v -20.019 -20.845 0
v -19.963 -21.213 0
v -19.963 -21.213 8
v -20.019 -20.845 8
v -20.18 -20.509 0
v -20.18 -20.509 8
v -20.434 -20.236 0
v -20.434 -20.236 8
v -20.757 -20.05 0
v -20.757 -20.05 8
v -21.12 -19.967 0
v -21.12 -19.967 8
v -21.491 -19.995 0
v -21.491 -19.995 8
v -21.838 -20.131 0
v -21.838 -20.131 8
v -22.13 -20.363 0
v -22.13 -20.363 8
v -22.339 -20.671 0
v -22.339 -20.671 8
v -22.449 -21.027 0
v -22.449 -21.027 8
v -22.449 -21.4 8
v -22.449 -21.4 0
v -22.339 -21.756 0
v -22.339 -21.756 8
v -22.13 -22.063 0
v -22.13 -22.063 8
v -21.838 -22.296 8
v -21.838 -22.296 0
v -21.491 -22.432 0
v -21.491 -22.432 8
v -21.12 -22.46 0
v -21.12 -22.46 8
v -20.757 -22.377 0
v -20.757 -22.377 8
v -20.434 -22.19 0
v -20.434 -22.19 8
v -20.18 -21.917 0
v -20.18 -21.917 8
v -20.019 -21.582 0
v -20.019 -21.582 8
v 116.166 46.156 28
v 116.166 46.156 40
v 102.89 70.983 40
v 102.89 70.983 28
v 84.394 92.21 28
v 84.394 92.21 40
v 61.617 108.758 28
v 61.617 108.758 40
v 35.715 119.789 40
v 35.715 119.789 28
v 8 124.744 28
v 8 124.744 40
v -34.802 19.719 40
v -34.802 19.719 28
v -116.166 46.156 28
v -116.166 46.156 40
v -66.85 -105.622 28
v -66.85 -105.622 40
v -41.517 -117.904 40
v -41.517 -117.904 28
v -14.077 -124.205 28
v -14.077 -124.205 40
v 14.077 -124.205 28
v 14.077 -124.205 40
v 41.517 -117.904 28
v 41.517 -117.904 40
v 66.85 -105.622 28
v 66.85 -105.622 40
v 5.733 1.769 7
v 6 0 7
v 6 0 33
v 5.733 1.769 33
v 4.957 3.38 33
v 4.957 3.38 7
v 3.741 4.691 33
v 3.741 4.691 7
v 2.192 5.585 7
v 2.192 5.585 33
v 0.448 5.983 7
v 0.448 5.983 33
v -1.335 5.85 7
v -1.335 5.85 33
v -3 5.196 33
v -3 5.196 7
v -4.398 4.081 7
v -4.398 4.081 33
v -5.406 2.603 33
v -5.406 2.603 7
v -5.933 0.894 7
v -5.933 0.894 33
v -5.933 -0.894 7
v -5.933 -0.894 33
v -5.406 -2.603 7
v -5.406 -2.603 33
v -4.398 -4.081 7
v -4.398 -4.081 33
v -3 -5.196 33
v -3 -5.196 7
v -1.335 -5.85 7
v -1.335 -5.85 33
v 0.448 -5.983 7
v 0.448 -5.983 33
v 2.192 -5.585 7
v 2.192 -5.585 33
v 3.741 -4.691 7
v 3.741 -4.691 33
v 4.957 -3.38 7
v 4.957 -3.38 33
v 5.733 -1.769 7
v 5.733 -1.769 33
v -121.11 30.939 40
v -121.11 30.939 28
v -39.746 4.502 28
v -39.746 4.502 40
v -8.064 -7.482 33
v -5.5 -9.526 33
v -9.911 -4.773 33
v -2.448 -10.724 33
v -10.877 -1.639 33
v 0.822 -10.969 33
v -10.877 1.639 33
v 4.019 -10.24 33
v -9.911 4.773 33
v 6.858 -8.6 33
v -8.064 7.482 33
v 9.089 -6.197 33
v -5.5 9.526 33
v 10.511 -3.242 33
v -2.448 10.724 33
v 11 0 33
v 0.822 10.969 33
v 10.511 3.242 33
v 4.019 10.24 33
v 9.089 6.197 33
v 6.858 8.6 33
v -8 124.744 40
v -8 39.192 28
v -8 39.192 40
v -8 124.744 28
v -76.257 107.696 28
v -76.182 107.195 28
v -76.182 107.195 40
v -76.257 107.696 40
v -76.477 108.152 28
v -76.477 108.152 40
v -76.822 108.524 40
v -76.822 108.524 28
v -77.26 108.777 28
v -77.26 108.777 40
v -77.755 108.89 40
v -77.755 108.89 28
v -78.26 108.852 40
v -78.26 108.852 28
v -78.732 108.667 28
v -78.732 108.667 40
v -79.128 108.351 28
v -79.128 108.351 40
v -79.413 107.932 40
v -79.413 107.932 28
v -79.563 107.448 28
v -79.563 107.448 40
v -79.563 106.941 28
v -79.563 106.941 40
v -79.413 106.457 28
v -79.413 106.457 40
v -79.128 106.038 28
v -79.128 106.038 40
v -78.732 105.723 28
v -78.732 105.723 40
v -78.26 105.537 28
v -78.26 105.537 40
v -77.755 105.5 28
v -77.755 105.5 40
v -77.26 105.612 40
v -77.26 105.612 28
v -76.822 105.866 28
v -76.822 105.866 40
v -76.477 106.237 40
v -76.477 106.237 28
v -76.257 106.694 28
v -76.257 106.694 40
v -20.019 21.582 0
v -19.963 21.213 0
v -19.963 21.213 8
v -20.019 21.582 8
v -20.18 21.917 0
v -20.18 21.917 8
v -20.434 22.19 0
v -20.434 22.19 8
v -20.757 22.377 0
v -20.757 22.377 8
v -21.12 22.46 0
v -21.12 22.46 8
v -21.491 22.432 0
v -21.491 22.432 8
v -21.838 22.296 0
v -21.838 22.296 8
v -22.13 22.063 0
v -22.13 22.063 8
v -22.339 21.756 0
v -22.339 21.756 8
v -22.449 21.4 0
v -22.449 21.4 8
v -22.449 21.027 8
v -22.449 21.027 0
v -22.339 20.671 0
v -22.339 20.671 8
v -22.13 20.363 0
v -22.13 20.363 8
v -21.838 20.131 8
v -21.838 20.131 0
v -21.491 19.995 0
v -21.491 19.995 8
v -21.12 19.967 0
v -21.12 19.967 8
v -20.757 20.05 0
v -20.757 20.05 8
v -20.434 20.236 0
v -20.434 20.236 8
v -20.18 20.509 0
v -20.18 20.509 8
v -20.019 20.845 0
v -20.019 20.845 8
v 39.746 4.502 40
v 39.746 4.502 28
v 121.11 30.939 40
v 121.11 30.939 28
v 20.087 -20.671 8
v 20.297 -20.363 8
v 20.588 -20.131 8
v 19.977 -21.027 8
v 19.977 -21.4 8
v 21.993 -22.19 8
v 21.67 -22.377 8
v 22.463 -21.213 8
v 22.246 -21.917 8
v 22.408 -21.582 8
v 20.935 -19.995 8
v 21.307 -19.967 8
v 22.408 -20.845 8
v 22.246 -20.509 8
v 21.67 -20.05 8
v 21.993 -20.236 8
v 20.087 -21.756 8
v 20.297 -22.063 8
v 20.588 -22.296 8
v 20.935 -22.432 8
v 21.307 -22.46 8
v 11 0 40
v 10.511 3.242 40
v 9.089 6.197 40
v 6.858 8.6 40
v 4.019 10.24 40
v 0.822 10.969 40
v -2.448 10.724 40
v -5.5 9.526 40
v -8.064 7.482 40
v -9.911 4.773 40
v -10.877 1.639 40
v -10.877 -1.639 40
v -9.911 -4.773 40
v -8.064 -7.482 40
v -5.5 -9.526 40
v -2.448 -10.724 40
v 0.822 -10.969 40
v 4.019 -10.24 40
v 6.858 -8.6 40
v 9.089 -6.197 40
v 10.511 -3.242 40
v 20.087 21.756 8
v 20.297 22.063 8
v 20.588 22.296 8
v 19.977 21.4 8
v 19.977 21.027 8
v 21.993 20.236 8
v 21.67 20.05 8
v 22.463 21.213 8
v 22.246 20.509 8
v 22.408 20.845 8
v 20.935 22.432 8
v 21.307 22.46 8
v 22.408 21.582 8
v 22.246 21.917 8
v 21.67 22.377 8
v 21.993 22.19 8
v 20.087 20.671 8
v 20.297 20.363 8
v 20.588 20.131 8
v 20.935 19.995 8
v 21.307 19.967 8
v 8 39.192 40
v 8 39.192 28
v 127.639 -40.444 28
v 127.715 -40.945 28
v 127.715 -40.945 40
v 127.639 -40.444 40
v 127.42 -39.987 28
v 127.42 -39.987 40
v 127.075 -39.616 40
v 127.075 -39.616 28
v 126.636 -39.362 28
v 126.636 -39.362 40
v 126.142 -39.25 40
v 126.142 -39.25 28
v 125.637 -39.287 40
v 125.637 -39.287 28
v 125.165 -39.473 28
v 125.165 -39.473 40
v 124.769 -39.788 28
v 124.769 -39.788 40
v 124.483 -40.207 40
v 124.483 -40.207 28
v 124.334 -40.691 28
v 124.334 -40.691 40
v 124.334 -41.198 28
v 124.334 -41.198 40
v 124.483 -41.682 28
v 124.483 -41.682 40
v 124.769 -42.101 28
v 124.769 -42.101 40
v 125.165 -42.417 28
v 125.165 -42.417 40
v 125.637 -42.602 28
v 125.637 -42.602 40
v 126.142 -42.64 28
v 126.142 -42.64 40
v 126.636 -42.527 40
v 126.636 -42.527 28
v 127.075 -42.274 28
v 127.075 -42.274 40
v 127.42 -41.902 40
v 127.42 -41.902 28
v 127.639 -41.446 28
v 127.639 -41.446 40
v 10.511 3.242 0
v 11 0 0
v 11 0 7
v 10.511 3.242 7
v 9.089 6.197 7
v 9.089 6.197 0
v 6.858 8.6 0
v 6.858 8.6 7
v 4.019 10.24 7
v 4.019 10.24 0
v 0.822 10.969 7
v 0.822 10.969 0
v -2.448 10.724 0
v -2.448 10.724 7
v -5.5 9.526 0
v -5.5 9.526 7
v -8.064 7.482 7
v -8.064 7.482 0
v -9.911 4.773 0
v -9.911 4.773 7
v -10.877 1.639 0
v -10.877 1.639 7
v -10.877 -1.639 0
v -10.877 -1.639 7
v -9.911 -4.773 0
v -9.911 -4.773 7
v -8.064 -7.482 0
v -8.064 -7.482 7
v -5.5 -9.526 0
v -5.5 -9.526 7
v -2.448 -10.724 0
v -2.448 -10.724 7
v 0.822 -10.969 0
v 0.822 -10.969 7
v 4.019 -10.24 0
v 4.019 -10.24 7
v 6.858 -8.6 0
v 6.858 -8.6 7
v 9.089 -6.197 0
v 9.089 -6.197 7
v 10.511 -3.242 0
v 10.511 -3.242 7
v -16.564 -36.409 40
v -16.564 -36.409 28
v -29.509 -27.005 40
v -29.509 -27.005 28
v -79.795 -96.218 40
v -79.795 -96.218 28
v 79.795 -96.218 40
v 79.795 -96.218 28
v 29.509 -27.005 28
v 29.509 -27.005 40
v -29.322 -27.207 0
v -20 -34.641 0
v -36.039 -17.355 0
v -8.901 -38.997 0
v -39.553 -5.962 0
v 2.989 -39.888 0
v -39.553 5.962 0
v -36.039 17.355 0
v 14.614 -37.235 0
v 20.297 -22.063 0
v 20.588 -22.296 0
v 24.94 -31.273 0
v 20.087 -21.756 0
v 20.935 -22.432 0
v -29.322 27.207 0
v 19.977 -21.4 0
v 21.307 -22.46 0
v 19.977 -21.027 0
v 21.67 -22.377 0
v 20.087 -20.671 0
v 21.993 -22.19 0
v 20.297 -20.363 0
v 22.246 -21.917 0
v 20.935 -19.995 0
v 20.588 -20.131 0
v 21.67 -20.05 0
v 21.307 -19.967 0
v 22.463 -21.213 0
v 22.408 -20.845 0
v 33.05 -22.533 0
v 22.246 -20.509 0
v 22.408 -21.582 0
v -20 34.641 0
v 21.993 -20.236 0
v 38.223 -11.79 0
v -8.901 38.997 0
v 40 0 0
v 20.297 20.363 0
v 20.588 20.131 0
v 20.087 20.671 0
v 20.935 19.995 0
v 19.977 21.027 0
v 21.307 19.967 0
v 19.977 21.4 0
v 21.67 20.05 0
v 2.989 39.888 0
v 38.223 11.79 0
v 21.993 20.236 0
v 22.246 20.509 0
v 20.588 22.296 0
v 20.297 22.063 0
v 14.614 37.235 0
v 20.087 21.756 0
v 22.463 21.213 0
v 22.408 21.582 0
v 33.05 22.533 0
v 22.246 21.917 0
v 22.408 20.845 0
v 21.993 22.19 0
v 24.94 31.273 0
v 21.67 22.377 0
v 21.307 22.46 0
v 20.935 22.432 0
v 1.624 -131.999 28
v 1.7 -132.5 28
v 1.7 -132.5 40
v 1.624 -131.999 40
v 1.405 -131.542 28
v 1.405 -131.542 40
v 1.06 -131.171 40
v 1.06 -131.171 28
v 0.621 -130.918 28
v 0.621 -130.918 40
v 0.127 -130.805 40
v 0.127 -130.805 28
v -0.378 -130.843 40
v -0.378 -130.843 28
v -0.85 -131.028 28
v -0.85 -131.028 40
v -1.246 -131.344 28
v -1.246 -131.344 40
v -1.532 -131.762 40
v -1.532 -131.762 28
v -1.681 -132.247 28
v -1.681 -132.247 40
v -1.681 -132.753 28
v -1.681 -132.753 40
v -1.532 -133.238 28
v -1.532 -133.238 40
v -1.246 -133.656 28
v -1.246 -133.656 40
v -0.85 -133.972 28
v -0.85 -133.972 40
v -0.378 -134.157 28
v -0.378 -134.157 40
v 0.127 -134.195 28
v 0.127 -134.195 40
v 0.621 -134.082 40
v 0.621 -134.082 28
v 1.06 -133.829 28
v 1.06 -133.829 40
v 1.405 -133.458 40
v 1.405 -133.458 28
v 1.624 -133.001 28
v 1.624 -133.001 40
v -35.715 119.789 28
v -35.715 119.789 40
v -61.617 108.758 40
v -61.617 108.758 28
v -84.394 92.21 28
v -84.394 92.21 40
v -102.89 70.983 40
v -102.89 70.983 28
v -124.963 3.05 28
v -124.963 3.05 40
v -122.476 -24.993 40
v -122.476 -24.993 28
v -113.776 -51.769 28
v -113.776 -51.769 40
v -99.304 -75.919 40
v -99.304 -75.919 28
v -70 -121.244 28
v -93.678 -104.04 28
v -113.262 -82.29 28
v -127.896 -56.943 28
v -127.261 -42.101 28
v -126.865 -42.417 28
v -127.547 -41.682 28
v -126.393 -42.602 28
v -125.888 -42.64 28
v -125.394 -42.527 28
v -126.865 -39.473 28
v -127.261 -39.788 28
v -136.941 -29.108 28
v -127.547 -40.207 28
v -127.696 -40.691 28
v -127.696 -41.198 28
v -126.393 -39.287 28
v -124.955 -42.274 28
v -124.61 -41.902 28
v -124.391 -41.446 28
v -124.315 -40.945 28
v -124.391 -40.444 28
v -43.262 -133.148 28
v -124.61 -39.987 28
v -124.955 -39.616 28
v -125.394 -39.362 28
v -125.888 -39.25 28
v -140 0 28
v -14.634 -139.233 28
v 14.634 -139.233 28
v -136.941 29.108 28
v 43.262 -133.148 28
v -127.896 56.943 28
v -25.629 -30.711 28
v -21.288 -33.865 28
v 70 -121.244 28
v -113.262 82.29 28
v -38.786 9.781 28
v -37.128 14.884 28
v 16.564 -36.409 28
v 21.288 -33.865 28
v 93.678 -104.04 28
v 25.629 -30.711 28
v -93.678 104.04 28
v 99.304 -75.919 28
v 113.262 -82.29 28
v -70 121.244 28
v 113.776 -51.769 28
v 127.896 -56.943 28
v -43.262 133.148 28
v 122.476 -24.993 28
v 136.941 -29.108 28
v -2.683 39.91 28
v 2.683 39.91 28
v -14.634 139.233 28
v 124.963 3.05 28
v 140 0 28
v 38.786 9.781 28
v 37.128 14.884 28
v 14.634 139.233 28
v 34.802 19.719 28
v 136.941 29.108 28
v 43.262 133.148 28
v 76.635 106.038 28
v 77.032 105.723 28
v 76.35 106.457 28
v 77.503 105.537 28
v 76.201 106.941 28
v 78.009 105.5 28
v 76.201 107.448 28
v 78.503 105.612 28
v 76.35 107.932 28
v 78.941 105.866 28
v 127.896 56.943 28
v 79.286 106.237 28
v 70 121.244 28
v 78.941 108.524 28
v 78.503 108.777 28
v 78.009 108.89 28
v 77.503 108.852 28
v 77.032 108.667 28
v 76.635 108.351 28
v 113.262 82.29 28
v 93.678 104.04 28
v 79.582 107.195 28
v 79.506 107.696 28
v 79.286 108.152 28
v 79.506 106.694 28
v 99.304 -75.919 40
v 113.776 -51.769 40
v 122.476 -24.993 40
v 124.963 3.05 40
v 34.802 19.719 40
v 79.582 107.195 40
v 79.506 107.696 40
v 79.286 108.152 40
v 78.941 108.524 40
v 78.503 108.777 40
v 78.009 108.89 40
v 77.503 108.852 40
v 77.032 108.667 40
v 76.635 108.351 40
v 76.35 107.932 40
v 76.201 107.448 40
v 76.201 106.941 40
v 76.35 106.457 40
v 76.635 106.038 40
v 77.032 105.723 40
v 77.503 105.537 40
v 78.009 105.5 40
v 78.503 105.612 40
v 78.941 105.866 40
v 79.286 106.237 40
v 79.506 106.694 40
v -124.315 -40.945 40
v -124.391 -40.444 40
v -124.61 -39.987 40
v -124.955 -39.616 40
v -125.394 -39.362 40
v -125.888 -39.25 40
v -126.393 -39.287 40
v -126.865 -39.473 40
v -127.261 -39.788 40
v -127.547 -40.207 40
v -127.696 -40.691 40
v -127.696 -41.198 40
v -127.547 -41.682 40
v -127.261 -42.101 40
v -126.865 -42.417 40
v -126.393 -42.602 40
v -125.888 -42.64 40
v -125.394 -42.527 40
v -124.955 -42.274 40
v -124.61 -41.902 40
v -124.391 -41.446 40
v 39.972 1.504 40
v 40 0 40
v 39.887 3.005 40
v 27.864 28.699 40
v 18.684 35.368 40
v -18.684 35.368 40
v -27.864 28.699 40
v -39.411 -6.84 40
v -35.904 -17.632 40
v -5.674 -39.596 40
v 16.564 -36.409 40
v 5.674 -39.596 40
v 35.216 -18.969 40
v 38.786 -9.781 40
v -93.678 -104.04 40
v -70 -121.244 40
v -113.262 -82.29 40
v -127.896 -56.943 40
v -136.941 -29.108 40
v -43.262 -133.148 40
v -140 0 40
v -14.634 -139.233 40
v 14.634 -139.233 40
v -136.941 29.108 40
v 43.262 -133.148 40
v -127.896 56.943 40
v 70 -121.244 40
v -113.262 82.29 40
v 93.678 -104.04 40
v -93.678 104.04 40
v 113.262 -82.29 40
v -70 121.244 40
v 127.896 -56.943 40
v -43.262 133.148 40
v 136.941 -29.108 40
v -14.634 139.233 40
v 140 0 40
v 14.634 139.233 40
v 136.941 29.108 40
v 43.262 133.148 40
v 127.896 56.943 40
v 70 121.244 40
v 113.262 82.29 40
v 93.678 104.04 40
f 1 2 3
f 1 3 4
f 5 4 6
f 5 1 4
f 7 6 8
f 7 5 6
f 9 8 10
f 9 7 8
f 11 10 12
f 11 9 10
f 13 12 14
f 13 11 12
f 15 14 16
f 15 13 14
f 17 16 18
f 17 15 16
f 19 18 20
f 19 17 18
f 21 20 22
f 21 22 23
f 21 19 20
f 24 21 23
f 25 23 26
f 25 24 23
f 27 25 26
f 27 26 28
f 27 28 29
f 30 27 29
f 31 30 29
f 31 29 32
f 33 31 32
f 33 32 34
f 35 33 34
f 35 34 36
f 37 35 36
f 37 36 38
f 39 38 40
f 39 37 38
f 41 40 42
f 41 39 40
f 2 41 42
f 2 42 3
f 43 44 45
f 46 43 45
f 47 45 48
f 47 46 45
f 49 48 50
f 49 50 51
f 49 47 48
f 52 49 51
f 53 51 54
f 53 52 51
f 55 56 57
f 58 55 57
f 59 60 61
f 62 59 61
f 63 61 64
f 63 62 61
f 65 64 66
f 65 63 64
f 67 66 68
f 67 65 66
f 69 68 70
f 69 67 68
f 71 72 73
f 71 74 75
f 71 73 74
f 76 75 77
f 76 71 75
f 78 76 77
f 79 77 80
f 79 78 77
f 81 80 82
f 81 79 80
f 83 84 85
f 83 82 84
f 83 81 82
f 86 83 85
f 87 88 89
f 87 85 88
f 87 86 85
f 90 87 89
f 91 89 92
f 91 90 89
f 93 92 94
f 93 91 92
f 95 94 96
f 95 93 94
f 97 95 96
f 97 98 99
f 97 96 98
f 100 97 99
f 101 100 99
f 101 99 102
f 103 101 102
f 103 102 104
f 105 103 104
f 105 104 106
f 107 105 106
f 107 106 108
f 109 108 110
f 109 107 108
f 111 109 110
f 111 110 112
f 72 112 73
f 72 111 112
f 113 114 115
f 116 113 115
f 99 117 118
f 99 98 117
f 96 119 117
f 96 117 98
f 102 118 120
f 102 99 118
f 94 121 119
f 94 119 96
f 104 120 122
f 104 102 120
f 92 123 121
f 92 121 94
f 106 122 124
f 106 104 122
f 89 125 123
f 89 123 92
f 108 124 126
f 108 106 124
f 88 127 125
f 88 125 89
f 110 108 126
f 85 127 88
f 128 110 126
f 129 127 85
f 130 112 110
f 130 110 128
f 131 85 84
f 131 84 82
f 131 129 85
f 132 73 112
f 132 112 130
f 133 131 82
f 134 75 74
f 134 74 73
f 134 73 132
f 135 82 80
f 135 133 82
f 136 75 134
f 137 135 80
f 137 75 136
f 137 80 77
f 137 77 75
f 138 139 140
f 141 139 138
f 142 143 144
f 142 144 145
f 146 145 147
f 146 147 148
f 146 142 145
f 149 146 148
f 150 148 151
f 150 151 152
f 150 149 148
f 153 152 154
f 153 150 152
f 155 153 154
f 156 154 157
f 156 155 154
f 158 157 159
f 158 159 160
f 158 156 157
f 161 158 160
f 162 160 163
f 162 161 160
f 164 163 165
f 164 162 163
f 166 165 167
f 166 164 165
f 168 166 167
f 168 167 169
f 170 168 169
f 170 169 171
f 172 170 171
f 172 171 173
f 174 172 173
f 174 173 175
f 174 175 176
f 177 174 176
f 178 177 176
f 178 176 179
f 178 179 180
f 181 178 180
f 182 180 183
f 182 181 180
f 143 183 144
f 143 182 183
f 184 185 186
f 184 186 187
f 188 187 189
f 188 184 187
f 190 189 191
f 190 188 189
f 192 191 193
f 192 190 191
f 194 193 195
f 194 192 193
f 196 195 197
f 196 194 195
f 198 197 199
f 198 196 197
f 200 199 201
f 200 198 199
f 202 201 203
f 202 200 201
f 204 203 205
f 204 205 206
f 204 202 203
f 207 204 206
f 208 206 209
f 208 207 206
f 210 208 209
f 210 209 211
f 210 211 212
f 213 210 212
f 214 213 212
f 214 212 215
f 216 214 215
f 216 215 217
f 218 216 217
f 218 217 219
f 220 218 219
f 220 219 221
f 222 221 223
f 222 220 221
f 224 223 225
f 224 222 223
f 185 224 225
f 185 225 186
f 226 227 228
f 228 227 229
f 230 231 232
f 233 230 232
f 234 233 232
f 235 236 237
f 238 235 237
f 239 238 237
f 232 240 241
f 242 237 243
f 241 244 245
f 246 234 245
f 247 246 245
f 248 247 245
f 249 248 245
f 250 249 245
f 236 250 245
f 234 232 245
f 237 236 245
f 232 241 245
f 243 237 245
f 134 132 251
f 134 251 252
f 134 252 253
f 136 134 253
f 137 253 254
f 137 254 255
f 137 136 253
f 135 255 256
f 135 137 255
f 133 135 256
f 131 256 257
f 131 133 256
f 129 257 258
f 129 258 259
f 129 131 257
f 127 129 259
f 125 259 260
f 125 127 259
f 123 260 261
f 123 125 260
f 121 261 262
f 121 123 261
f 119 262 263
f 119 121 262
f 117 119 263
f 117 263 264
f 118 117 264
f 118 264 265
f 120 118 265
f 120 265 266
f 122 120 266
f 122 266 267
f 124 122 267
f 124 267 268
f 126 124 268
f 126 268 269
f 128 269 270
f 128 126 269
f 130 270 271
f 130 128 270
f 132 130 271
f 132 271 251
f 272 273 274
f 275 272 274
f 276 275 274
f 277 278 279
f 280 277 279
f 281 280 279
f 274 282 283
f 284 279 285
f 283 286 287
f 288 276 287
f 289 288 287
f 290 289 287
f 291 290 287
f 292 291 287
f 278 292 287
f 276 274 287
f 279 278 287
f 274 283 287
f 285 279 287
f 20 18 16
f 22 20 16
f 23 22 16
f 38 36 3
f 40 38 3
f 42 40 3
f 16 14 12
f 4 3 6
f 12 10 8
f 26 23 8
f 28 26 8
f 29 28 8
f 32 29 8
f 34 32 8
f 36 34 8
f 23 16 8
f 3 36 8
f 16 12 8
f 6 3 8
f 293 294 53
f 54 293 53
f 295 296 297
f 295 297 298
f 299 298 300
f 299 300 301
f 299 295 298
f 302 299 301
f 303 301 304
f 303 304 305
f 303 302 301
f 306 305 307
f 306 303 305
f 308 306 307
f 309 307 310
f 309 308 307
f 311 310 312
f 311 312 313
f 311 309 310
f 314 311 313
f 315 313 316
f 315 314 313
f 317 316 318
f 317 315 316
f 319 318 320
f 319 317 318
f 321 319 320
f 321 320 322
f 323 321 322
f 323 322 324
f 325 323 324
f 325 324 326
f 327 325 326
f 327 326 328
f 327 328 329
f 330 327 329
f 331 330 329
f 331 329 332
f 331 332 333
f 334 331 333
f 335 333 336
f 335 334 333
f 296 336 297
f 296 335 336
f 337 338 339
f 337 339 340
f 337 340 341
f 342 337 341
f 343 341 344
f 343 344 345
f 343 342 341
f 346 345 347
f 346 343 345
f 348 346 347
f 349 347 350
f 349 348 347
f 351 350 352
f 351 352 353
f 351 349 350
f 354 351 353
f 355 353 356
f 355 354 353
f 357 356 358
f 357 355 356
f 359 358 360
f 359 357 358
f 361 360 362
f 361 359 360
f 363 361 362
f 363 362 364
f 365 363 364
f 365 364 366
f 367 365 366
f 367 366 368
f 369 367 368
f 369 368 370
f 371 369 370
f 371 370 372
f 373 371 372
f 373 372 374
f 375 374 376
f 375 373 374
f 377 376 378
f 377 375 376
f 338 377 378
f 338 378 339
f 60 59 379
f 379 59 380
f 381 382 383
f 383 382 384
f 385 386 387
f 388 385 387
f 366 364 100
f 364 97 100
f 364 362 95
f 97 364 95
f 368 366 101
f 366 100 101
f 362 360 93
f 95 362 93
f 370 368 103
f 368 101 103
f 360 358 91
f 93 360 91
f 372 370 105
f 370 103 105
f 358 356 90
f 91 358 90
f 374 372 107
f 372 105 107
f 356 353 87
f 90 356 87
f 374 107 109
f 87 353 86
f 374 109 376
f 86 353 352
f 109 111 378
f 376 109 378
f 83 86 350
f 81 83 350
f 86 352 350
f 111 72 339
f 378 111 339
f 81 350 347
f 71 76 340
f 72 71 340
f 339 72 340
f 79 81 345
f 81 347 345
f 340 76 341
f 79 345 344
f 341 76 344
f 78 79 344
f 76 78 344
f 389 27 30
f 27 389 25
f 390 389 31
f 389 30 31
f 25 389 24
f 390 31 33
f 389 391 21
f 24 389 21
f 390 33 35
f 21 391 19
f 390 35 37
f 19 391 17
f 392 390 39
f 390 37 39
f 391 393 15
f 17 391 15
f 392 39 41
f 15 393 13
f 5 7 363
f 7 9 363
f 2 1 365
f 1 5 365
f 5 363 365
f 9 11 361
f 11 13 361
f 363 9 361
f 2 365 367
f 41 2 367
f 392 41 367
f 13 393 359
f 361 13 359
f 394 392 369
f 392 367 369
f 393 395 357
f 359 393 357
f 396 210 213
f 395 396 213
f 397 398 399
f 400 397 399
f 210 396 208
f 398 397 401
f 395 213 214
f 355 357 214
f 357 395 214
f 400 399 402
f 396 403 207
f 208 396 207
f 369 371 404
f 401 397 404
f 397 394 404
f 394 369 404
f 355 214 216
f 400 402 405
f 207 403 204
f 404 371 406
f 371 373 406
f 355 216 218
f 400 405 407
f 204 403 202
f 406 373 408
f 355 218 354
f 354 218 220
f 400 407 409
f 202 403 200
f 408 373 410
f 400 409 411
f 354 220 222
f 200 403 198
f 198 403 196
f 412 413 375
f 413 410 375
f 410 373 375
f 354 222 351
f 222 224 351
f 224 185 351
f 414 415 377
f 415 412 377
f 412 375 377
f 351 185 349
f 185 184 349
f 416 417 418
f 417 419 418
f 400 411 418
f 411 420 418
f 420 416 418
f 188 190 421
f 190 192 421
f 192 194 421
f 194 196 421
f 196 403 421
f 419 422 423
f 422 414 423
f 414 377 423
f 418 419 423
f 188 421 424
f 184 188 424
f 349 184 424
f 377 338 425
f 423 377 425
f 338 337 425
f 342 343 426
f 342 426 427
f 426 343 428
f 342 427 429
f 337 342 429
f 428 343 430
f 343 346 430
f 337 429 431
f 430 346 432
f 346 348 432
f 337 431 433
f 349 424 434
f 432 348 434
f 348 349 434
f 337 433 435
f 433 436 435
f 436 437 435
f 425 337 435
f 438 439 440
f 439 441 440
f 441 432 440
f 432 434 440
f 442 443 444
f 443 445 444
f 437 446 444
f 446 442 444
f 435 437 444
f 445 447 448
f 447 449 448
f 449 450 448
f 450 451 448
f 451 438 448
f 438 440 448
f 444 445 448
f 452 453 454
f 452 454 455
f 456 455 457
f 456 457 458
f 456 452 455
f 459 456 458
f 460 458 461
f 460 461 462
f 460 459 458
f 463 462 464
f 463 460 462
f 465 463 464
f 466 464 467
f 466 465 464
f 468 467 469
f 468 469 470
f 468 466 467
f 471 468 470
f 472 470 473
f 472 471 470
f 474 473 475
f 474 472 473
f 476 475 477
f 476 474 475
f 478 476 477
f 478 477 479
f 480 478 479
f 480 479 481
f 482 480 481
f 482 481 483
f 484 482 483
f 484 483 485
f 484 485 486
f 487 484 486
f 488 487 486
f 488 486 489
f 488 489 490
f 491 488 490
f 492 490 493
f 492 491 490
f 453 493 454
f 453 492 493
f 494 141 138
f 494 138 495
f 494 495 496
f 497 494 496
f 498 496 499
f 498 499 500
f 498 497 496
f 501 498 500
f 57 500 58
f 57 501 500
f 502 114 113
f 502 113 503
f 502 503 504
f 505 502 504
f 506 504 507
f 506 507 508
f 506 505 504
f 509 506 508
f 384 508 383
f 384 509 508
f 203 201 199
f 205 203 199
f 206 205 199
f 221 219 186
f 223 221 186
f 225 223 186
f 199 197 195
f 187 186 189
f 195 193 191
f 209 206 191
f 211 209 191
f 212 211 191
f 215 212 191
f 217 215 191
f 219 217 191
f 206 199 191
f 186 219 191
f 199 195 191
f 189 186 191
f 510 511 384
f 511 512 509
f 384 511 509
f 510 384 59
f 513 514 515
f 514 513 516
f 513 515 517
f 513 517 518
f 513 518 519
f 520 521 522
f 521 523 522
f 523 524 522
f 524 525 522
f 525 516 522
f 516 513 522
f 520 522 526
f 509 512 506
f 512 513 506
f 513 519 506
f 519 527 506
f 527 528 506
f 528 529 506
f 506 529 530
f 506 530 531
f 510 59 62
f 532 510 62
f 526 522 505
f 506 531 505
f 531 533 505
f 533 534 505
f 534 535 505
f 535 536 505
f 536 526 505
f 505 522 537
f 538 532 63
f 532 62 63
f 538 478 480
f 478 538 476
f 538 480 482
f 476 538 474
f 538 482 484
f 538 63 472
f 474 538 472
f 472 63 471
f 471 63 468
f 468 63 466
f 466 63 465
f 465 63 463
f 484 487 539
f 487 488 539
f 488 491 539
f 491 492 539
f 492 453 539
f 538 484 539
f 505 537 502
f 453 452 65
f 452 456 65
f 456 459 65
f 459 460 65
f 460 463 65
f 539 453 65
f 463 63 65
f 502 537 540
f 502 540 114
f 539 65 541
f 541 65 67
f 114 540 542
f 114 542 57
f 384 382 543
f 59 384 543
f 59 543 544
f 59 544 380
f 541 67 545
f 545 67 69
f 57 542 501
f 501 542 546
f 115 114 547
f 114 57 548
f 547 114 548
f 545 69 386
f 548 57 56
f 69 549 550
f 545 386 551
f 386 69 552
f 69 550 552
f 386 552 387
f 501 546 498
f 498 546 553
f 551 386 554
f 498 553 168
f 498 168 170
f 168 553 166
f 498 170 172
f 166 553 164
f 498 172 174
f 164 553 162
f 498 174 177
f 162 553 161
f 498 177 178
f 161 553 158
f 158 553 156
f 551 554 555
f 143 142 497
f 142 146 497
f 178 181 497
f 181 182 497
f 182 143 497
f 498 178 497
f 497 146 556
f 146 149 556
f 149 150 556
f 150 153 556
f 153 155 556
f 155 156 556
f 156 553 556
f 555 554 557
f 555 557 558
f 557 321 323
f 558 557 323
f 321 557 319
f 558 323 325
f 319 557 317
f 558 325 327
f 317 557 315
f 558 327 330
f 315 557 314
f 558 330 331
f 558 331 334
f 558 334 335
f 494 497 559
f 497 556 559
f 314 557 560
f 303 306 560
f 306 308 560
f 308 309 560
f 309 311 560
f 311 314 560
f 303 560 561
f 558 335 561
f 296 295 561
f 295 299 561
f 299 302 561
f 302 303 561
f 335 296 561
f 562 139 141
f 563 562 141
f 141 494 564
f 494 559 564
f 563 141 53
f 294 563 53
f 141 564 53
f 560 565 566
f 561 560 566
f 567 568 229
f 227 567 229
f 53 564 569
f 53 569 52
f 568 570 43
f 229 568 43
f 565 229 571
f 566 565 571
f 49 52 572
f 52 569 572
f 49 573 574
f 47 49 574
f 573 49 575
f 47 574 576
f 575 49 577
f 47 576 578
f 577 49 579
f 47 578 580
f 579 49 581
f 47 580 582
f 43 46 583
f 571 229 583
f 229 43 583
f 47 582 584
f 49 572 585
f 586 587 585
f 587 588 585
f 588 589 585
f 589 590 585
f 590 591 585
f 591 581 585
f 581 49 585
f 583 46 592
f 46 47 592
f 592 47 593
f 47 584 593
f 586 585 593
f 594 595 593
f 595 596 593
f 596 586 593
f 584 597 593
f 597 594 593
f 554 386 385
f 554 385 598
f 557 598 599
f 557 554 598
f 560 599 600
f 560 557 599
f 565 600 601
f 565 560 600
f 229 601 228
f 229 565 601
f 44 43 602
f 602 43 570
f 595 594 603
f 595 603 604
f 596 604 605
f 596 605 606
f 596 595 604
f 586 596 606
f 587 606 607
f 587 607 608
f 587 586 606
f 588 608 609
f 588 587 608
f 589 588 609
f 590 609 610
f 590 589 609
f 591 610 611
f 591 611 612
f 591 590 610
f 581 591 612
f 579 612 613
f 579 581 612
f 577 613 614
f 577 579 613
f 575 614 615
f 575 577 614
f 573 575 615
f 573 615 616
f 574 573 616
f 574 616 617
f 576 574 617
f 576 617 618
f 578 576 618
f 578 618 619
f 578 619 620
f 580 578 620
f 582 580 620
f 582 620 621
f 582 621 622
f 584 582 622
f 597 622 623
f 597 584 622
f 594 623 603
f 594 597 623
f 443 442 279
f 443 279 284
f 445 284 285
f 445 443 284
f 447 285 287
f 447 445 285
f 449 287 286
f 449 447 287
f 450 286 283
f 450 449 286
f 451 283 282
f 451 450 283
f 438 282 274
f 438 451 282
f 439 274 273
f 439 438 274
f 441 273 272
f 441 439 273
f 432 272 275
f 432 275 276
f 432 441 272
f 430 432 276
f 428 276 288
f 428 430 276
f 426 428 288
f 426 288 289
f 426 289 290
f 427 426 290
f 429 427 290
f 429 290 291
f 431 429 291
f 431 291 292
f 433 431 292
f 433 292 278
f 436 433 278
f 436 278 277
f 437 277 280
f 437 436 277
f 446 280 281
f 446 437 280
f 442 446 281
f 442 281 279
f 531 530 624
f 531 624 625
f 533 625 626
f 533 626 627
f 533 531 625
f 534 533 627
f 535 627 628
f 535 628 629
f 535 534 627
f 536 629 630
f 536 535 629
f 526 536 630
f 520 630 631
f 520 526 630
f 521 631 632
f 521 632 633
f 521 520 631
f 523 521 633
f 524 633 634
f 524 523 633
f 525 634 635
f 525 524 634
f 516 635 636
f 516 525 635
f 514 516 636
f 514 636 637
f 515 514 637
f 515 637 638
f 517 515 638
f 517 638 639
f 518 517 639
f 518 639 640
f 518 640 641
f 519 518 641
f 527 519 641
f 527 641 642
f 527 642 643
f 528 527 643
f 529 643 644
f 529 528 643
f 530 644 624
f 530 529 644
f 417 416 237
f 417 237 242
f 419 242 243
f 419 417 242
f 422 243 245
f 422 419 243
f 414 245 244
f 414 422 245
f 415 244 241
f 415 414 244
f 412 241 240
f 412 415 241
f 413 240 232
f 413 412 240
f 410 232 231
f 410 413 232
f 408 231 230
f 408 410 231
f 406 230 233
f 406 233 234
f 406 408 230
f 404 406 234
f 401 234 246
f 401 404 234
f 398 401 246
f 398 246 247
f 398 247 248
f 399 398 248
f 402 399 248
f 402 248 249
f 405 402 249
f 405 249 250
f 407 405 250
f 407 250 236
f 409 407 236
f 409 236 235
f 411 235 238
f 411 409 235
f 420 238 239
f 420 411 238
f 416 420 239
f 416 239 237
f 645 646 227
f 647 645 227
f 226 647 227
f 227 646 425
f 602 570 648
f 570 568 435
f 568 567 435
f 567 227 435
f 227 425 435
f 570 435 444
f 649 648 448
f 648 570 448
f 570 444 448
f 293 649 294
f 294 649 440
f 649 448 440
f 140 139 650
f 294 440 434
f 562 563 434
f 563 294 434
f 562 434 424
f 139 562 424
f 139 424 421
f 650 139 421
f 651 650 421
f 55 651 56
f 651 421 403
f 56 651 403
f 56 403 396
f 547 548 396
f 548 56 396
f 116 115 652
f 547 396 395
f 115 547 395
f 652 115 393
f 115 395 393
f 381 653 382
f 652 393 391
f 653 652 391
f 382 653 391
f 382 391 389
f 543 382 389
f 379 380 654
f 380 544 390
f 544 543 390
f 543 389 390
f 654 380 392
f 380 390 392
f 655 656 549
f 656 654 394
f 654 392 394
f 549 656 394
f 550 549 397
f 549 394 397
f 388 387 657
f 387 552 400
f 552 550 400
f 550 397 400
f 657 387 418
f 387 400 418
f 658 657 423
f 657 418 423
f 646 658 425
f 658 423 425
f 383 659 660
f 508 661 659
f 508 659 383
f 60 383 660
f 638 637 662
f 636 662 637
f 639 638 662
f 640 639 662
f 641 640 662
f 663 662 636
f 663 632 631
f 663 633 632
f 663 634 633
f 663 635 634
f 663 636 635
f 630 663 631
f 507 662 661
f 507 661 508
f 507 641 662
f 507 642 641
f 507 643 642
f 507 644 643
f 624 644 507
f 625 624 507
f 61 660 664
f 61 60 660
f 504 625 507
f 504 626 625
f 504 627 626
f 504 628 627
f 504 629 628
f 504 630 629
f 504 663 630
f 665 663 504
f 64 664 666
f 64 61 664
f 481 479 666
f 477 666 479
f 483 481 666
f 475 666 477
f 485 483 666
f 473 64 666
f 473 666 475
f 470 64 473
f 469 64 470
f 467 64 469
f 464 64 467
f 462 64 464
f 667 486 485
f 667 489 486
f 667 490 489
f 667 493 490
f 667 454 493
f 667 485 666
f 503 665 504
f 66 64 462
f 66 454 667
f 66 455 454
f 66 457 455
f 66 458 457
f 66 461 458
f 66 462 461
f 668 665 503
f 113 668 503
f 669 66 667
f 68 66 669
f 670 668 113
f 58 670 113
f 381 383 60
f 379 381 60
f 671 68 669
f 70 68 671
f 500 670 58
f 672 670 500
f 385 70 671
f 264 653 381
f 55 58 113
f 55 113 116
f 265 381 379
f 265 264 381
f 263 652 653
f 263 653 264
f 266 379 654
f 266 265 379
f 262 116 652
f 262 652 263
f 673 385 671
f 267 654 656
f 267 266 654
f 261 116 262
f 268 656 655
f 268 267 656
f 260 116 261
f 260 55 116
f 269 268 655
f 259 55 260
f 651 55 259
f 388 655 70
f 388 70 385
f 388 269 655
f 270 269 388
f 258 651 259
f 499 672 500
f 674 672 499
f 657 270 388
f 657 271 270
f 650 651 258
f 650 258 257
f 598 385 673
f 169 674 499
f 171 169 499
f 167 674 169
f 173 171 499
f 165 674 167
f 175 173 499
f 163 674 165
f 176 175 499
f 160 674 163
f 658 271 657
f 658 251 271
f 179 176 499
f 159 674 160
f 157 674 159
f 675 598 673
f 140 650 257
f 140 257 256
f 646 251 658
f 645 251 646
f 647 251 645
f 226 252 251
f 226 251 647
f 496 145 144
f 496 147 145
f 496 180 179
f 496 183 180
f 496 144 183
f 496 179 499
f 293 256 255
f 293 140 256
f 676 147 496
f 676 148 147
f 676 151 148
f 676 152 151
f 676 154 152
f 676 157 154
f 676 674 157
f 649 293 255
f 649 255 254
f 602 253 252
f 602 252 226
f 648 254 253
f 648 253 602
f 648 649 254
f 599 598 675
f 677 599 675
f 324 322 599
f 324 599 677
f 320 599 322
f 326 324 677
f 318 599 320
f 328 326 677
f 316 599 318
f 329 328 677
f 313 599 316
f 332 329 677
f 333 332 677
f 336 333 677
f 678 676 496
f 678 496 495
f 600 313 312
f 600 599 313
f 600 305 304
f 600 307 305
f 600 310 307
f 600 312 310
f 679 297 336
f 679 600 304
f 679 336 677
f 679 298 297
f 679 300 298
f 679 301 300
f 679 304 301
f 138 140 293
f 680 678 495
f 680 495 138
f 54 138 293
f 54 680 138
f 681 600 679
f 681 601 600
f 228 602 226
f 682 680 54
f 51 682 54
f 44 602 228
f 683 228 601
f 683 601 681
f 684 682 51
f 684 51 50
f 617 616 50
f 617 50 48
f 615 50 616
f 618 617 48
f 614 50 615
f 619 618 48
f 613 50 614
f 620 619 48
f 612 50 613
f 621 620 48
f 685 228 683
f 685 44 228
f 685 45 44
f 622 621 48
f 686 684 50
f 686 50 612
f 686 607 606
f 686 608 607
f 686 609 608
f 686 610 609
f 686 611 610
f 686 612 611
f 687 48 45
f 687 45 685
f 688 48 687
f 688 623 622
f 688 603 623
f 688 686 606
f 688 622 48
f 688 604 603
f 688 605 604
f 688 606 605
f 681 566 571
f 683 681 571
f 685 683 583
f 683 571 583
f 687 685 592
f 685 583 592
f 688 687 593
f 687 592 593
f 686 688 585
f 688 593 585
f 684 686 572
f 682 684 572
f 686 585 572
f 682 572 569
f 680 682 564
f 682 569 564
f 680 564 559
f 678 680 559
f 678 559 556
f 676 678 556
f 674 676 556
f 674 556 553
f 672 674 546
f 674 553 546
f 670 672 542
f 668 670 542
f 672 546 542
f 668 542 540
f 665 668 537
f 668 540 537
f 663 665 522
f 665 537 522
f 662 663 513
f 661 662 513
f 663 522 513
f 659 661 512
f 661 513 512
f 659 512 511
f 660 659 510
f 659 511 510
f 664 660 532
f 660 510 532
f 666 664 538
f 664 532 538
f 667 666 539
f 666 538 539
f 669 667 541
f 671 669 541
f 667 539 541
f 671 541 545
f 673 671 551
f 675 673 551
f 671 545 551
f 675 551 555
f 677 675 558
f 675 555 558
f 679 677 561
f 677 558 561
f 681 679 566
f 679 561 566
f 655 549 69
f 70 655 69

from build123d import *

# Parameters (mm, degrees)
SKETCH1_R               = 140
SKETCH1_R_2             = 125
RING_DEPTH              = 12
SKETCH2_R               = 40
HUB_DEPTH               = 40
SKETCH3_W               = 16
SKETCH3_H               = 87
SPOKES_DEPTH            = 12
SKETCH4_R               = 6
BORE_DEPTH              = 40
SKETCH5_R               = 11
BEARING_SEAT_LOW_DEPTH  = 7
SKETCH6_R               = 11
BEARING_SEAT_HIGH_DEPTH = 7
SKETCH7_R               = 1.7
RING_SCREWS_DEPTH       = 12
SKETCH8_R               = 1.25
GROMMET_SCREWS_DEPTH    = 8


with BuildPart() as part:
    # Sketch1 → Ring (new body)
    with BuildSketch(Plane.XY.offset(28)):
        Circle(SKETCH1_R)
        Circle(SKETCH1_R_2, mode=Mode.SUBTRACT)
    extrude(amount=RING_DEPTH)



with BuildPart() as body_2:
    # Sketch2 → Hub (new body)
    with BuildSketch(Plane.XY):
        Circle(SKETCH2_R)
    extrude(amount=HUB_DEPTH)


with BuildPart() as part_1:
    add(part.part)

    add(body_2.part)  # Spokes merges body 2
    # Sketch3 → Spokes (add)
    with BuildSketch(Plane.XY.offset(28)):
        Polygon((39.563340091, 4.44321065), (122.305257008, 31.327689161), (117.360985098, 46.544593422), (34.619068181, 19.660114911), align=None)
        with Locations((0, 82.5)):
            Rectangle(SKETCH3_W, SKETCH3_H)
        Polygon((-34.619068181, 19.660114911), (-117.360985098, 46.544593422), (-122.305257008, 31.327689161), (-39.563340091, 4.44321065), align=None)
        Polygon((-29.395760794, -26.849380762), (-80.533077744, -97.233859273), (-67.588805834, -106.63842331), (-16.451488884, -36.253944799), align=None)
        Polygon((16.451488884, -36.253944799), (67.588805834, -106.63842331), (80.533077744, -97.233859273), (29.395760794, -26.849380762), align=None)
    extrude(amount=SPOKES_DEPTH)

    # Sketch4 → Bore (cut)
    with BuildSketch(Plane.XY):
        Circle(SKETCH4_R)
    extrude(amount=BORE_DEPTH, mode=Mode.SUBTRACT)

    # Sketch5 → Bearing_seat_low (cut)
    with BuildSketch(Plane.XY):
        Circle(SKETCH5_R)
    extrude(amount=BEARING_SEAT_LOW_DEPTH, mode=Mode.SUBTRACT)

    # Sketch6 → Bearing_seat_high (cut)
    with BuildSketch(Plane.XY.offset(33)):
        Circle(SKETCH6_R)
    extrude(amount=BEARING_SEAT_HIGH_DEPTH, mode=Mode.SUBTRACT)

    # Sketch7 → Ring_screws (cut)
    with BuildSketch(Plane.XY.offset(28)):
        with Locations((77.881545929, 107.194751755)):
            Circle(SKETCH7_R)
        with Locations((-77.881545929, 107.194751755)):
            Circle(SKETCH7_R)
        with Locations((-126.014988409, -40.944751755)):
            Circle(SKETCH7_R)
        with Locations((0, -132.5)):
            Circle(SKETCH7_R)
        with Locations((126.014988409, -40.944751755)):
            Circle(SKETCH7_R)
    extrude(amount=RING_SCREWS_DEPTH, mode=Mode.SUBTRACT)

    # Sketch8 → Grommet_screws (cut)
    with BuildSketch(Plane.XY):
        with Locations((21.213203436, 21.213203436)):
            Circle(SKETCH8_R)
        with Locations((-21.213203436, 21.213203436)):
            Circle(SKETCH8_R)
        with Locations((-21.213203436, -21.213203436)):
            Circle(SKETCH8_R)
        with Locations((21.213203436, -21.213203436)):
            Circle(SKETCH8_R)
    extrude(amount=GROMMET_SCREWS_DEPTH, mode=Mode.SUBTRACT)


solid = part_1.part
